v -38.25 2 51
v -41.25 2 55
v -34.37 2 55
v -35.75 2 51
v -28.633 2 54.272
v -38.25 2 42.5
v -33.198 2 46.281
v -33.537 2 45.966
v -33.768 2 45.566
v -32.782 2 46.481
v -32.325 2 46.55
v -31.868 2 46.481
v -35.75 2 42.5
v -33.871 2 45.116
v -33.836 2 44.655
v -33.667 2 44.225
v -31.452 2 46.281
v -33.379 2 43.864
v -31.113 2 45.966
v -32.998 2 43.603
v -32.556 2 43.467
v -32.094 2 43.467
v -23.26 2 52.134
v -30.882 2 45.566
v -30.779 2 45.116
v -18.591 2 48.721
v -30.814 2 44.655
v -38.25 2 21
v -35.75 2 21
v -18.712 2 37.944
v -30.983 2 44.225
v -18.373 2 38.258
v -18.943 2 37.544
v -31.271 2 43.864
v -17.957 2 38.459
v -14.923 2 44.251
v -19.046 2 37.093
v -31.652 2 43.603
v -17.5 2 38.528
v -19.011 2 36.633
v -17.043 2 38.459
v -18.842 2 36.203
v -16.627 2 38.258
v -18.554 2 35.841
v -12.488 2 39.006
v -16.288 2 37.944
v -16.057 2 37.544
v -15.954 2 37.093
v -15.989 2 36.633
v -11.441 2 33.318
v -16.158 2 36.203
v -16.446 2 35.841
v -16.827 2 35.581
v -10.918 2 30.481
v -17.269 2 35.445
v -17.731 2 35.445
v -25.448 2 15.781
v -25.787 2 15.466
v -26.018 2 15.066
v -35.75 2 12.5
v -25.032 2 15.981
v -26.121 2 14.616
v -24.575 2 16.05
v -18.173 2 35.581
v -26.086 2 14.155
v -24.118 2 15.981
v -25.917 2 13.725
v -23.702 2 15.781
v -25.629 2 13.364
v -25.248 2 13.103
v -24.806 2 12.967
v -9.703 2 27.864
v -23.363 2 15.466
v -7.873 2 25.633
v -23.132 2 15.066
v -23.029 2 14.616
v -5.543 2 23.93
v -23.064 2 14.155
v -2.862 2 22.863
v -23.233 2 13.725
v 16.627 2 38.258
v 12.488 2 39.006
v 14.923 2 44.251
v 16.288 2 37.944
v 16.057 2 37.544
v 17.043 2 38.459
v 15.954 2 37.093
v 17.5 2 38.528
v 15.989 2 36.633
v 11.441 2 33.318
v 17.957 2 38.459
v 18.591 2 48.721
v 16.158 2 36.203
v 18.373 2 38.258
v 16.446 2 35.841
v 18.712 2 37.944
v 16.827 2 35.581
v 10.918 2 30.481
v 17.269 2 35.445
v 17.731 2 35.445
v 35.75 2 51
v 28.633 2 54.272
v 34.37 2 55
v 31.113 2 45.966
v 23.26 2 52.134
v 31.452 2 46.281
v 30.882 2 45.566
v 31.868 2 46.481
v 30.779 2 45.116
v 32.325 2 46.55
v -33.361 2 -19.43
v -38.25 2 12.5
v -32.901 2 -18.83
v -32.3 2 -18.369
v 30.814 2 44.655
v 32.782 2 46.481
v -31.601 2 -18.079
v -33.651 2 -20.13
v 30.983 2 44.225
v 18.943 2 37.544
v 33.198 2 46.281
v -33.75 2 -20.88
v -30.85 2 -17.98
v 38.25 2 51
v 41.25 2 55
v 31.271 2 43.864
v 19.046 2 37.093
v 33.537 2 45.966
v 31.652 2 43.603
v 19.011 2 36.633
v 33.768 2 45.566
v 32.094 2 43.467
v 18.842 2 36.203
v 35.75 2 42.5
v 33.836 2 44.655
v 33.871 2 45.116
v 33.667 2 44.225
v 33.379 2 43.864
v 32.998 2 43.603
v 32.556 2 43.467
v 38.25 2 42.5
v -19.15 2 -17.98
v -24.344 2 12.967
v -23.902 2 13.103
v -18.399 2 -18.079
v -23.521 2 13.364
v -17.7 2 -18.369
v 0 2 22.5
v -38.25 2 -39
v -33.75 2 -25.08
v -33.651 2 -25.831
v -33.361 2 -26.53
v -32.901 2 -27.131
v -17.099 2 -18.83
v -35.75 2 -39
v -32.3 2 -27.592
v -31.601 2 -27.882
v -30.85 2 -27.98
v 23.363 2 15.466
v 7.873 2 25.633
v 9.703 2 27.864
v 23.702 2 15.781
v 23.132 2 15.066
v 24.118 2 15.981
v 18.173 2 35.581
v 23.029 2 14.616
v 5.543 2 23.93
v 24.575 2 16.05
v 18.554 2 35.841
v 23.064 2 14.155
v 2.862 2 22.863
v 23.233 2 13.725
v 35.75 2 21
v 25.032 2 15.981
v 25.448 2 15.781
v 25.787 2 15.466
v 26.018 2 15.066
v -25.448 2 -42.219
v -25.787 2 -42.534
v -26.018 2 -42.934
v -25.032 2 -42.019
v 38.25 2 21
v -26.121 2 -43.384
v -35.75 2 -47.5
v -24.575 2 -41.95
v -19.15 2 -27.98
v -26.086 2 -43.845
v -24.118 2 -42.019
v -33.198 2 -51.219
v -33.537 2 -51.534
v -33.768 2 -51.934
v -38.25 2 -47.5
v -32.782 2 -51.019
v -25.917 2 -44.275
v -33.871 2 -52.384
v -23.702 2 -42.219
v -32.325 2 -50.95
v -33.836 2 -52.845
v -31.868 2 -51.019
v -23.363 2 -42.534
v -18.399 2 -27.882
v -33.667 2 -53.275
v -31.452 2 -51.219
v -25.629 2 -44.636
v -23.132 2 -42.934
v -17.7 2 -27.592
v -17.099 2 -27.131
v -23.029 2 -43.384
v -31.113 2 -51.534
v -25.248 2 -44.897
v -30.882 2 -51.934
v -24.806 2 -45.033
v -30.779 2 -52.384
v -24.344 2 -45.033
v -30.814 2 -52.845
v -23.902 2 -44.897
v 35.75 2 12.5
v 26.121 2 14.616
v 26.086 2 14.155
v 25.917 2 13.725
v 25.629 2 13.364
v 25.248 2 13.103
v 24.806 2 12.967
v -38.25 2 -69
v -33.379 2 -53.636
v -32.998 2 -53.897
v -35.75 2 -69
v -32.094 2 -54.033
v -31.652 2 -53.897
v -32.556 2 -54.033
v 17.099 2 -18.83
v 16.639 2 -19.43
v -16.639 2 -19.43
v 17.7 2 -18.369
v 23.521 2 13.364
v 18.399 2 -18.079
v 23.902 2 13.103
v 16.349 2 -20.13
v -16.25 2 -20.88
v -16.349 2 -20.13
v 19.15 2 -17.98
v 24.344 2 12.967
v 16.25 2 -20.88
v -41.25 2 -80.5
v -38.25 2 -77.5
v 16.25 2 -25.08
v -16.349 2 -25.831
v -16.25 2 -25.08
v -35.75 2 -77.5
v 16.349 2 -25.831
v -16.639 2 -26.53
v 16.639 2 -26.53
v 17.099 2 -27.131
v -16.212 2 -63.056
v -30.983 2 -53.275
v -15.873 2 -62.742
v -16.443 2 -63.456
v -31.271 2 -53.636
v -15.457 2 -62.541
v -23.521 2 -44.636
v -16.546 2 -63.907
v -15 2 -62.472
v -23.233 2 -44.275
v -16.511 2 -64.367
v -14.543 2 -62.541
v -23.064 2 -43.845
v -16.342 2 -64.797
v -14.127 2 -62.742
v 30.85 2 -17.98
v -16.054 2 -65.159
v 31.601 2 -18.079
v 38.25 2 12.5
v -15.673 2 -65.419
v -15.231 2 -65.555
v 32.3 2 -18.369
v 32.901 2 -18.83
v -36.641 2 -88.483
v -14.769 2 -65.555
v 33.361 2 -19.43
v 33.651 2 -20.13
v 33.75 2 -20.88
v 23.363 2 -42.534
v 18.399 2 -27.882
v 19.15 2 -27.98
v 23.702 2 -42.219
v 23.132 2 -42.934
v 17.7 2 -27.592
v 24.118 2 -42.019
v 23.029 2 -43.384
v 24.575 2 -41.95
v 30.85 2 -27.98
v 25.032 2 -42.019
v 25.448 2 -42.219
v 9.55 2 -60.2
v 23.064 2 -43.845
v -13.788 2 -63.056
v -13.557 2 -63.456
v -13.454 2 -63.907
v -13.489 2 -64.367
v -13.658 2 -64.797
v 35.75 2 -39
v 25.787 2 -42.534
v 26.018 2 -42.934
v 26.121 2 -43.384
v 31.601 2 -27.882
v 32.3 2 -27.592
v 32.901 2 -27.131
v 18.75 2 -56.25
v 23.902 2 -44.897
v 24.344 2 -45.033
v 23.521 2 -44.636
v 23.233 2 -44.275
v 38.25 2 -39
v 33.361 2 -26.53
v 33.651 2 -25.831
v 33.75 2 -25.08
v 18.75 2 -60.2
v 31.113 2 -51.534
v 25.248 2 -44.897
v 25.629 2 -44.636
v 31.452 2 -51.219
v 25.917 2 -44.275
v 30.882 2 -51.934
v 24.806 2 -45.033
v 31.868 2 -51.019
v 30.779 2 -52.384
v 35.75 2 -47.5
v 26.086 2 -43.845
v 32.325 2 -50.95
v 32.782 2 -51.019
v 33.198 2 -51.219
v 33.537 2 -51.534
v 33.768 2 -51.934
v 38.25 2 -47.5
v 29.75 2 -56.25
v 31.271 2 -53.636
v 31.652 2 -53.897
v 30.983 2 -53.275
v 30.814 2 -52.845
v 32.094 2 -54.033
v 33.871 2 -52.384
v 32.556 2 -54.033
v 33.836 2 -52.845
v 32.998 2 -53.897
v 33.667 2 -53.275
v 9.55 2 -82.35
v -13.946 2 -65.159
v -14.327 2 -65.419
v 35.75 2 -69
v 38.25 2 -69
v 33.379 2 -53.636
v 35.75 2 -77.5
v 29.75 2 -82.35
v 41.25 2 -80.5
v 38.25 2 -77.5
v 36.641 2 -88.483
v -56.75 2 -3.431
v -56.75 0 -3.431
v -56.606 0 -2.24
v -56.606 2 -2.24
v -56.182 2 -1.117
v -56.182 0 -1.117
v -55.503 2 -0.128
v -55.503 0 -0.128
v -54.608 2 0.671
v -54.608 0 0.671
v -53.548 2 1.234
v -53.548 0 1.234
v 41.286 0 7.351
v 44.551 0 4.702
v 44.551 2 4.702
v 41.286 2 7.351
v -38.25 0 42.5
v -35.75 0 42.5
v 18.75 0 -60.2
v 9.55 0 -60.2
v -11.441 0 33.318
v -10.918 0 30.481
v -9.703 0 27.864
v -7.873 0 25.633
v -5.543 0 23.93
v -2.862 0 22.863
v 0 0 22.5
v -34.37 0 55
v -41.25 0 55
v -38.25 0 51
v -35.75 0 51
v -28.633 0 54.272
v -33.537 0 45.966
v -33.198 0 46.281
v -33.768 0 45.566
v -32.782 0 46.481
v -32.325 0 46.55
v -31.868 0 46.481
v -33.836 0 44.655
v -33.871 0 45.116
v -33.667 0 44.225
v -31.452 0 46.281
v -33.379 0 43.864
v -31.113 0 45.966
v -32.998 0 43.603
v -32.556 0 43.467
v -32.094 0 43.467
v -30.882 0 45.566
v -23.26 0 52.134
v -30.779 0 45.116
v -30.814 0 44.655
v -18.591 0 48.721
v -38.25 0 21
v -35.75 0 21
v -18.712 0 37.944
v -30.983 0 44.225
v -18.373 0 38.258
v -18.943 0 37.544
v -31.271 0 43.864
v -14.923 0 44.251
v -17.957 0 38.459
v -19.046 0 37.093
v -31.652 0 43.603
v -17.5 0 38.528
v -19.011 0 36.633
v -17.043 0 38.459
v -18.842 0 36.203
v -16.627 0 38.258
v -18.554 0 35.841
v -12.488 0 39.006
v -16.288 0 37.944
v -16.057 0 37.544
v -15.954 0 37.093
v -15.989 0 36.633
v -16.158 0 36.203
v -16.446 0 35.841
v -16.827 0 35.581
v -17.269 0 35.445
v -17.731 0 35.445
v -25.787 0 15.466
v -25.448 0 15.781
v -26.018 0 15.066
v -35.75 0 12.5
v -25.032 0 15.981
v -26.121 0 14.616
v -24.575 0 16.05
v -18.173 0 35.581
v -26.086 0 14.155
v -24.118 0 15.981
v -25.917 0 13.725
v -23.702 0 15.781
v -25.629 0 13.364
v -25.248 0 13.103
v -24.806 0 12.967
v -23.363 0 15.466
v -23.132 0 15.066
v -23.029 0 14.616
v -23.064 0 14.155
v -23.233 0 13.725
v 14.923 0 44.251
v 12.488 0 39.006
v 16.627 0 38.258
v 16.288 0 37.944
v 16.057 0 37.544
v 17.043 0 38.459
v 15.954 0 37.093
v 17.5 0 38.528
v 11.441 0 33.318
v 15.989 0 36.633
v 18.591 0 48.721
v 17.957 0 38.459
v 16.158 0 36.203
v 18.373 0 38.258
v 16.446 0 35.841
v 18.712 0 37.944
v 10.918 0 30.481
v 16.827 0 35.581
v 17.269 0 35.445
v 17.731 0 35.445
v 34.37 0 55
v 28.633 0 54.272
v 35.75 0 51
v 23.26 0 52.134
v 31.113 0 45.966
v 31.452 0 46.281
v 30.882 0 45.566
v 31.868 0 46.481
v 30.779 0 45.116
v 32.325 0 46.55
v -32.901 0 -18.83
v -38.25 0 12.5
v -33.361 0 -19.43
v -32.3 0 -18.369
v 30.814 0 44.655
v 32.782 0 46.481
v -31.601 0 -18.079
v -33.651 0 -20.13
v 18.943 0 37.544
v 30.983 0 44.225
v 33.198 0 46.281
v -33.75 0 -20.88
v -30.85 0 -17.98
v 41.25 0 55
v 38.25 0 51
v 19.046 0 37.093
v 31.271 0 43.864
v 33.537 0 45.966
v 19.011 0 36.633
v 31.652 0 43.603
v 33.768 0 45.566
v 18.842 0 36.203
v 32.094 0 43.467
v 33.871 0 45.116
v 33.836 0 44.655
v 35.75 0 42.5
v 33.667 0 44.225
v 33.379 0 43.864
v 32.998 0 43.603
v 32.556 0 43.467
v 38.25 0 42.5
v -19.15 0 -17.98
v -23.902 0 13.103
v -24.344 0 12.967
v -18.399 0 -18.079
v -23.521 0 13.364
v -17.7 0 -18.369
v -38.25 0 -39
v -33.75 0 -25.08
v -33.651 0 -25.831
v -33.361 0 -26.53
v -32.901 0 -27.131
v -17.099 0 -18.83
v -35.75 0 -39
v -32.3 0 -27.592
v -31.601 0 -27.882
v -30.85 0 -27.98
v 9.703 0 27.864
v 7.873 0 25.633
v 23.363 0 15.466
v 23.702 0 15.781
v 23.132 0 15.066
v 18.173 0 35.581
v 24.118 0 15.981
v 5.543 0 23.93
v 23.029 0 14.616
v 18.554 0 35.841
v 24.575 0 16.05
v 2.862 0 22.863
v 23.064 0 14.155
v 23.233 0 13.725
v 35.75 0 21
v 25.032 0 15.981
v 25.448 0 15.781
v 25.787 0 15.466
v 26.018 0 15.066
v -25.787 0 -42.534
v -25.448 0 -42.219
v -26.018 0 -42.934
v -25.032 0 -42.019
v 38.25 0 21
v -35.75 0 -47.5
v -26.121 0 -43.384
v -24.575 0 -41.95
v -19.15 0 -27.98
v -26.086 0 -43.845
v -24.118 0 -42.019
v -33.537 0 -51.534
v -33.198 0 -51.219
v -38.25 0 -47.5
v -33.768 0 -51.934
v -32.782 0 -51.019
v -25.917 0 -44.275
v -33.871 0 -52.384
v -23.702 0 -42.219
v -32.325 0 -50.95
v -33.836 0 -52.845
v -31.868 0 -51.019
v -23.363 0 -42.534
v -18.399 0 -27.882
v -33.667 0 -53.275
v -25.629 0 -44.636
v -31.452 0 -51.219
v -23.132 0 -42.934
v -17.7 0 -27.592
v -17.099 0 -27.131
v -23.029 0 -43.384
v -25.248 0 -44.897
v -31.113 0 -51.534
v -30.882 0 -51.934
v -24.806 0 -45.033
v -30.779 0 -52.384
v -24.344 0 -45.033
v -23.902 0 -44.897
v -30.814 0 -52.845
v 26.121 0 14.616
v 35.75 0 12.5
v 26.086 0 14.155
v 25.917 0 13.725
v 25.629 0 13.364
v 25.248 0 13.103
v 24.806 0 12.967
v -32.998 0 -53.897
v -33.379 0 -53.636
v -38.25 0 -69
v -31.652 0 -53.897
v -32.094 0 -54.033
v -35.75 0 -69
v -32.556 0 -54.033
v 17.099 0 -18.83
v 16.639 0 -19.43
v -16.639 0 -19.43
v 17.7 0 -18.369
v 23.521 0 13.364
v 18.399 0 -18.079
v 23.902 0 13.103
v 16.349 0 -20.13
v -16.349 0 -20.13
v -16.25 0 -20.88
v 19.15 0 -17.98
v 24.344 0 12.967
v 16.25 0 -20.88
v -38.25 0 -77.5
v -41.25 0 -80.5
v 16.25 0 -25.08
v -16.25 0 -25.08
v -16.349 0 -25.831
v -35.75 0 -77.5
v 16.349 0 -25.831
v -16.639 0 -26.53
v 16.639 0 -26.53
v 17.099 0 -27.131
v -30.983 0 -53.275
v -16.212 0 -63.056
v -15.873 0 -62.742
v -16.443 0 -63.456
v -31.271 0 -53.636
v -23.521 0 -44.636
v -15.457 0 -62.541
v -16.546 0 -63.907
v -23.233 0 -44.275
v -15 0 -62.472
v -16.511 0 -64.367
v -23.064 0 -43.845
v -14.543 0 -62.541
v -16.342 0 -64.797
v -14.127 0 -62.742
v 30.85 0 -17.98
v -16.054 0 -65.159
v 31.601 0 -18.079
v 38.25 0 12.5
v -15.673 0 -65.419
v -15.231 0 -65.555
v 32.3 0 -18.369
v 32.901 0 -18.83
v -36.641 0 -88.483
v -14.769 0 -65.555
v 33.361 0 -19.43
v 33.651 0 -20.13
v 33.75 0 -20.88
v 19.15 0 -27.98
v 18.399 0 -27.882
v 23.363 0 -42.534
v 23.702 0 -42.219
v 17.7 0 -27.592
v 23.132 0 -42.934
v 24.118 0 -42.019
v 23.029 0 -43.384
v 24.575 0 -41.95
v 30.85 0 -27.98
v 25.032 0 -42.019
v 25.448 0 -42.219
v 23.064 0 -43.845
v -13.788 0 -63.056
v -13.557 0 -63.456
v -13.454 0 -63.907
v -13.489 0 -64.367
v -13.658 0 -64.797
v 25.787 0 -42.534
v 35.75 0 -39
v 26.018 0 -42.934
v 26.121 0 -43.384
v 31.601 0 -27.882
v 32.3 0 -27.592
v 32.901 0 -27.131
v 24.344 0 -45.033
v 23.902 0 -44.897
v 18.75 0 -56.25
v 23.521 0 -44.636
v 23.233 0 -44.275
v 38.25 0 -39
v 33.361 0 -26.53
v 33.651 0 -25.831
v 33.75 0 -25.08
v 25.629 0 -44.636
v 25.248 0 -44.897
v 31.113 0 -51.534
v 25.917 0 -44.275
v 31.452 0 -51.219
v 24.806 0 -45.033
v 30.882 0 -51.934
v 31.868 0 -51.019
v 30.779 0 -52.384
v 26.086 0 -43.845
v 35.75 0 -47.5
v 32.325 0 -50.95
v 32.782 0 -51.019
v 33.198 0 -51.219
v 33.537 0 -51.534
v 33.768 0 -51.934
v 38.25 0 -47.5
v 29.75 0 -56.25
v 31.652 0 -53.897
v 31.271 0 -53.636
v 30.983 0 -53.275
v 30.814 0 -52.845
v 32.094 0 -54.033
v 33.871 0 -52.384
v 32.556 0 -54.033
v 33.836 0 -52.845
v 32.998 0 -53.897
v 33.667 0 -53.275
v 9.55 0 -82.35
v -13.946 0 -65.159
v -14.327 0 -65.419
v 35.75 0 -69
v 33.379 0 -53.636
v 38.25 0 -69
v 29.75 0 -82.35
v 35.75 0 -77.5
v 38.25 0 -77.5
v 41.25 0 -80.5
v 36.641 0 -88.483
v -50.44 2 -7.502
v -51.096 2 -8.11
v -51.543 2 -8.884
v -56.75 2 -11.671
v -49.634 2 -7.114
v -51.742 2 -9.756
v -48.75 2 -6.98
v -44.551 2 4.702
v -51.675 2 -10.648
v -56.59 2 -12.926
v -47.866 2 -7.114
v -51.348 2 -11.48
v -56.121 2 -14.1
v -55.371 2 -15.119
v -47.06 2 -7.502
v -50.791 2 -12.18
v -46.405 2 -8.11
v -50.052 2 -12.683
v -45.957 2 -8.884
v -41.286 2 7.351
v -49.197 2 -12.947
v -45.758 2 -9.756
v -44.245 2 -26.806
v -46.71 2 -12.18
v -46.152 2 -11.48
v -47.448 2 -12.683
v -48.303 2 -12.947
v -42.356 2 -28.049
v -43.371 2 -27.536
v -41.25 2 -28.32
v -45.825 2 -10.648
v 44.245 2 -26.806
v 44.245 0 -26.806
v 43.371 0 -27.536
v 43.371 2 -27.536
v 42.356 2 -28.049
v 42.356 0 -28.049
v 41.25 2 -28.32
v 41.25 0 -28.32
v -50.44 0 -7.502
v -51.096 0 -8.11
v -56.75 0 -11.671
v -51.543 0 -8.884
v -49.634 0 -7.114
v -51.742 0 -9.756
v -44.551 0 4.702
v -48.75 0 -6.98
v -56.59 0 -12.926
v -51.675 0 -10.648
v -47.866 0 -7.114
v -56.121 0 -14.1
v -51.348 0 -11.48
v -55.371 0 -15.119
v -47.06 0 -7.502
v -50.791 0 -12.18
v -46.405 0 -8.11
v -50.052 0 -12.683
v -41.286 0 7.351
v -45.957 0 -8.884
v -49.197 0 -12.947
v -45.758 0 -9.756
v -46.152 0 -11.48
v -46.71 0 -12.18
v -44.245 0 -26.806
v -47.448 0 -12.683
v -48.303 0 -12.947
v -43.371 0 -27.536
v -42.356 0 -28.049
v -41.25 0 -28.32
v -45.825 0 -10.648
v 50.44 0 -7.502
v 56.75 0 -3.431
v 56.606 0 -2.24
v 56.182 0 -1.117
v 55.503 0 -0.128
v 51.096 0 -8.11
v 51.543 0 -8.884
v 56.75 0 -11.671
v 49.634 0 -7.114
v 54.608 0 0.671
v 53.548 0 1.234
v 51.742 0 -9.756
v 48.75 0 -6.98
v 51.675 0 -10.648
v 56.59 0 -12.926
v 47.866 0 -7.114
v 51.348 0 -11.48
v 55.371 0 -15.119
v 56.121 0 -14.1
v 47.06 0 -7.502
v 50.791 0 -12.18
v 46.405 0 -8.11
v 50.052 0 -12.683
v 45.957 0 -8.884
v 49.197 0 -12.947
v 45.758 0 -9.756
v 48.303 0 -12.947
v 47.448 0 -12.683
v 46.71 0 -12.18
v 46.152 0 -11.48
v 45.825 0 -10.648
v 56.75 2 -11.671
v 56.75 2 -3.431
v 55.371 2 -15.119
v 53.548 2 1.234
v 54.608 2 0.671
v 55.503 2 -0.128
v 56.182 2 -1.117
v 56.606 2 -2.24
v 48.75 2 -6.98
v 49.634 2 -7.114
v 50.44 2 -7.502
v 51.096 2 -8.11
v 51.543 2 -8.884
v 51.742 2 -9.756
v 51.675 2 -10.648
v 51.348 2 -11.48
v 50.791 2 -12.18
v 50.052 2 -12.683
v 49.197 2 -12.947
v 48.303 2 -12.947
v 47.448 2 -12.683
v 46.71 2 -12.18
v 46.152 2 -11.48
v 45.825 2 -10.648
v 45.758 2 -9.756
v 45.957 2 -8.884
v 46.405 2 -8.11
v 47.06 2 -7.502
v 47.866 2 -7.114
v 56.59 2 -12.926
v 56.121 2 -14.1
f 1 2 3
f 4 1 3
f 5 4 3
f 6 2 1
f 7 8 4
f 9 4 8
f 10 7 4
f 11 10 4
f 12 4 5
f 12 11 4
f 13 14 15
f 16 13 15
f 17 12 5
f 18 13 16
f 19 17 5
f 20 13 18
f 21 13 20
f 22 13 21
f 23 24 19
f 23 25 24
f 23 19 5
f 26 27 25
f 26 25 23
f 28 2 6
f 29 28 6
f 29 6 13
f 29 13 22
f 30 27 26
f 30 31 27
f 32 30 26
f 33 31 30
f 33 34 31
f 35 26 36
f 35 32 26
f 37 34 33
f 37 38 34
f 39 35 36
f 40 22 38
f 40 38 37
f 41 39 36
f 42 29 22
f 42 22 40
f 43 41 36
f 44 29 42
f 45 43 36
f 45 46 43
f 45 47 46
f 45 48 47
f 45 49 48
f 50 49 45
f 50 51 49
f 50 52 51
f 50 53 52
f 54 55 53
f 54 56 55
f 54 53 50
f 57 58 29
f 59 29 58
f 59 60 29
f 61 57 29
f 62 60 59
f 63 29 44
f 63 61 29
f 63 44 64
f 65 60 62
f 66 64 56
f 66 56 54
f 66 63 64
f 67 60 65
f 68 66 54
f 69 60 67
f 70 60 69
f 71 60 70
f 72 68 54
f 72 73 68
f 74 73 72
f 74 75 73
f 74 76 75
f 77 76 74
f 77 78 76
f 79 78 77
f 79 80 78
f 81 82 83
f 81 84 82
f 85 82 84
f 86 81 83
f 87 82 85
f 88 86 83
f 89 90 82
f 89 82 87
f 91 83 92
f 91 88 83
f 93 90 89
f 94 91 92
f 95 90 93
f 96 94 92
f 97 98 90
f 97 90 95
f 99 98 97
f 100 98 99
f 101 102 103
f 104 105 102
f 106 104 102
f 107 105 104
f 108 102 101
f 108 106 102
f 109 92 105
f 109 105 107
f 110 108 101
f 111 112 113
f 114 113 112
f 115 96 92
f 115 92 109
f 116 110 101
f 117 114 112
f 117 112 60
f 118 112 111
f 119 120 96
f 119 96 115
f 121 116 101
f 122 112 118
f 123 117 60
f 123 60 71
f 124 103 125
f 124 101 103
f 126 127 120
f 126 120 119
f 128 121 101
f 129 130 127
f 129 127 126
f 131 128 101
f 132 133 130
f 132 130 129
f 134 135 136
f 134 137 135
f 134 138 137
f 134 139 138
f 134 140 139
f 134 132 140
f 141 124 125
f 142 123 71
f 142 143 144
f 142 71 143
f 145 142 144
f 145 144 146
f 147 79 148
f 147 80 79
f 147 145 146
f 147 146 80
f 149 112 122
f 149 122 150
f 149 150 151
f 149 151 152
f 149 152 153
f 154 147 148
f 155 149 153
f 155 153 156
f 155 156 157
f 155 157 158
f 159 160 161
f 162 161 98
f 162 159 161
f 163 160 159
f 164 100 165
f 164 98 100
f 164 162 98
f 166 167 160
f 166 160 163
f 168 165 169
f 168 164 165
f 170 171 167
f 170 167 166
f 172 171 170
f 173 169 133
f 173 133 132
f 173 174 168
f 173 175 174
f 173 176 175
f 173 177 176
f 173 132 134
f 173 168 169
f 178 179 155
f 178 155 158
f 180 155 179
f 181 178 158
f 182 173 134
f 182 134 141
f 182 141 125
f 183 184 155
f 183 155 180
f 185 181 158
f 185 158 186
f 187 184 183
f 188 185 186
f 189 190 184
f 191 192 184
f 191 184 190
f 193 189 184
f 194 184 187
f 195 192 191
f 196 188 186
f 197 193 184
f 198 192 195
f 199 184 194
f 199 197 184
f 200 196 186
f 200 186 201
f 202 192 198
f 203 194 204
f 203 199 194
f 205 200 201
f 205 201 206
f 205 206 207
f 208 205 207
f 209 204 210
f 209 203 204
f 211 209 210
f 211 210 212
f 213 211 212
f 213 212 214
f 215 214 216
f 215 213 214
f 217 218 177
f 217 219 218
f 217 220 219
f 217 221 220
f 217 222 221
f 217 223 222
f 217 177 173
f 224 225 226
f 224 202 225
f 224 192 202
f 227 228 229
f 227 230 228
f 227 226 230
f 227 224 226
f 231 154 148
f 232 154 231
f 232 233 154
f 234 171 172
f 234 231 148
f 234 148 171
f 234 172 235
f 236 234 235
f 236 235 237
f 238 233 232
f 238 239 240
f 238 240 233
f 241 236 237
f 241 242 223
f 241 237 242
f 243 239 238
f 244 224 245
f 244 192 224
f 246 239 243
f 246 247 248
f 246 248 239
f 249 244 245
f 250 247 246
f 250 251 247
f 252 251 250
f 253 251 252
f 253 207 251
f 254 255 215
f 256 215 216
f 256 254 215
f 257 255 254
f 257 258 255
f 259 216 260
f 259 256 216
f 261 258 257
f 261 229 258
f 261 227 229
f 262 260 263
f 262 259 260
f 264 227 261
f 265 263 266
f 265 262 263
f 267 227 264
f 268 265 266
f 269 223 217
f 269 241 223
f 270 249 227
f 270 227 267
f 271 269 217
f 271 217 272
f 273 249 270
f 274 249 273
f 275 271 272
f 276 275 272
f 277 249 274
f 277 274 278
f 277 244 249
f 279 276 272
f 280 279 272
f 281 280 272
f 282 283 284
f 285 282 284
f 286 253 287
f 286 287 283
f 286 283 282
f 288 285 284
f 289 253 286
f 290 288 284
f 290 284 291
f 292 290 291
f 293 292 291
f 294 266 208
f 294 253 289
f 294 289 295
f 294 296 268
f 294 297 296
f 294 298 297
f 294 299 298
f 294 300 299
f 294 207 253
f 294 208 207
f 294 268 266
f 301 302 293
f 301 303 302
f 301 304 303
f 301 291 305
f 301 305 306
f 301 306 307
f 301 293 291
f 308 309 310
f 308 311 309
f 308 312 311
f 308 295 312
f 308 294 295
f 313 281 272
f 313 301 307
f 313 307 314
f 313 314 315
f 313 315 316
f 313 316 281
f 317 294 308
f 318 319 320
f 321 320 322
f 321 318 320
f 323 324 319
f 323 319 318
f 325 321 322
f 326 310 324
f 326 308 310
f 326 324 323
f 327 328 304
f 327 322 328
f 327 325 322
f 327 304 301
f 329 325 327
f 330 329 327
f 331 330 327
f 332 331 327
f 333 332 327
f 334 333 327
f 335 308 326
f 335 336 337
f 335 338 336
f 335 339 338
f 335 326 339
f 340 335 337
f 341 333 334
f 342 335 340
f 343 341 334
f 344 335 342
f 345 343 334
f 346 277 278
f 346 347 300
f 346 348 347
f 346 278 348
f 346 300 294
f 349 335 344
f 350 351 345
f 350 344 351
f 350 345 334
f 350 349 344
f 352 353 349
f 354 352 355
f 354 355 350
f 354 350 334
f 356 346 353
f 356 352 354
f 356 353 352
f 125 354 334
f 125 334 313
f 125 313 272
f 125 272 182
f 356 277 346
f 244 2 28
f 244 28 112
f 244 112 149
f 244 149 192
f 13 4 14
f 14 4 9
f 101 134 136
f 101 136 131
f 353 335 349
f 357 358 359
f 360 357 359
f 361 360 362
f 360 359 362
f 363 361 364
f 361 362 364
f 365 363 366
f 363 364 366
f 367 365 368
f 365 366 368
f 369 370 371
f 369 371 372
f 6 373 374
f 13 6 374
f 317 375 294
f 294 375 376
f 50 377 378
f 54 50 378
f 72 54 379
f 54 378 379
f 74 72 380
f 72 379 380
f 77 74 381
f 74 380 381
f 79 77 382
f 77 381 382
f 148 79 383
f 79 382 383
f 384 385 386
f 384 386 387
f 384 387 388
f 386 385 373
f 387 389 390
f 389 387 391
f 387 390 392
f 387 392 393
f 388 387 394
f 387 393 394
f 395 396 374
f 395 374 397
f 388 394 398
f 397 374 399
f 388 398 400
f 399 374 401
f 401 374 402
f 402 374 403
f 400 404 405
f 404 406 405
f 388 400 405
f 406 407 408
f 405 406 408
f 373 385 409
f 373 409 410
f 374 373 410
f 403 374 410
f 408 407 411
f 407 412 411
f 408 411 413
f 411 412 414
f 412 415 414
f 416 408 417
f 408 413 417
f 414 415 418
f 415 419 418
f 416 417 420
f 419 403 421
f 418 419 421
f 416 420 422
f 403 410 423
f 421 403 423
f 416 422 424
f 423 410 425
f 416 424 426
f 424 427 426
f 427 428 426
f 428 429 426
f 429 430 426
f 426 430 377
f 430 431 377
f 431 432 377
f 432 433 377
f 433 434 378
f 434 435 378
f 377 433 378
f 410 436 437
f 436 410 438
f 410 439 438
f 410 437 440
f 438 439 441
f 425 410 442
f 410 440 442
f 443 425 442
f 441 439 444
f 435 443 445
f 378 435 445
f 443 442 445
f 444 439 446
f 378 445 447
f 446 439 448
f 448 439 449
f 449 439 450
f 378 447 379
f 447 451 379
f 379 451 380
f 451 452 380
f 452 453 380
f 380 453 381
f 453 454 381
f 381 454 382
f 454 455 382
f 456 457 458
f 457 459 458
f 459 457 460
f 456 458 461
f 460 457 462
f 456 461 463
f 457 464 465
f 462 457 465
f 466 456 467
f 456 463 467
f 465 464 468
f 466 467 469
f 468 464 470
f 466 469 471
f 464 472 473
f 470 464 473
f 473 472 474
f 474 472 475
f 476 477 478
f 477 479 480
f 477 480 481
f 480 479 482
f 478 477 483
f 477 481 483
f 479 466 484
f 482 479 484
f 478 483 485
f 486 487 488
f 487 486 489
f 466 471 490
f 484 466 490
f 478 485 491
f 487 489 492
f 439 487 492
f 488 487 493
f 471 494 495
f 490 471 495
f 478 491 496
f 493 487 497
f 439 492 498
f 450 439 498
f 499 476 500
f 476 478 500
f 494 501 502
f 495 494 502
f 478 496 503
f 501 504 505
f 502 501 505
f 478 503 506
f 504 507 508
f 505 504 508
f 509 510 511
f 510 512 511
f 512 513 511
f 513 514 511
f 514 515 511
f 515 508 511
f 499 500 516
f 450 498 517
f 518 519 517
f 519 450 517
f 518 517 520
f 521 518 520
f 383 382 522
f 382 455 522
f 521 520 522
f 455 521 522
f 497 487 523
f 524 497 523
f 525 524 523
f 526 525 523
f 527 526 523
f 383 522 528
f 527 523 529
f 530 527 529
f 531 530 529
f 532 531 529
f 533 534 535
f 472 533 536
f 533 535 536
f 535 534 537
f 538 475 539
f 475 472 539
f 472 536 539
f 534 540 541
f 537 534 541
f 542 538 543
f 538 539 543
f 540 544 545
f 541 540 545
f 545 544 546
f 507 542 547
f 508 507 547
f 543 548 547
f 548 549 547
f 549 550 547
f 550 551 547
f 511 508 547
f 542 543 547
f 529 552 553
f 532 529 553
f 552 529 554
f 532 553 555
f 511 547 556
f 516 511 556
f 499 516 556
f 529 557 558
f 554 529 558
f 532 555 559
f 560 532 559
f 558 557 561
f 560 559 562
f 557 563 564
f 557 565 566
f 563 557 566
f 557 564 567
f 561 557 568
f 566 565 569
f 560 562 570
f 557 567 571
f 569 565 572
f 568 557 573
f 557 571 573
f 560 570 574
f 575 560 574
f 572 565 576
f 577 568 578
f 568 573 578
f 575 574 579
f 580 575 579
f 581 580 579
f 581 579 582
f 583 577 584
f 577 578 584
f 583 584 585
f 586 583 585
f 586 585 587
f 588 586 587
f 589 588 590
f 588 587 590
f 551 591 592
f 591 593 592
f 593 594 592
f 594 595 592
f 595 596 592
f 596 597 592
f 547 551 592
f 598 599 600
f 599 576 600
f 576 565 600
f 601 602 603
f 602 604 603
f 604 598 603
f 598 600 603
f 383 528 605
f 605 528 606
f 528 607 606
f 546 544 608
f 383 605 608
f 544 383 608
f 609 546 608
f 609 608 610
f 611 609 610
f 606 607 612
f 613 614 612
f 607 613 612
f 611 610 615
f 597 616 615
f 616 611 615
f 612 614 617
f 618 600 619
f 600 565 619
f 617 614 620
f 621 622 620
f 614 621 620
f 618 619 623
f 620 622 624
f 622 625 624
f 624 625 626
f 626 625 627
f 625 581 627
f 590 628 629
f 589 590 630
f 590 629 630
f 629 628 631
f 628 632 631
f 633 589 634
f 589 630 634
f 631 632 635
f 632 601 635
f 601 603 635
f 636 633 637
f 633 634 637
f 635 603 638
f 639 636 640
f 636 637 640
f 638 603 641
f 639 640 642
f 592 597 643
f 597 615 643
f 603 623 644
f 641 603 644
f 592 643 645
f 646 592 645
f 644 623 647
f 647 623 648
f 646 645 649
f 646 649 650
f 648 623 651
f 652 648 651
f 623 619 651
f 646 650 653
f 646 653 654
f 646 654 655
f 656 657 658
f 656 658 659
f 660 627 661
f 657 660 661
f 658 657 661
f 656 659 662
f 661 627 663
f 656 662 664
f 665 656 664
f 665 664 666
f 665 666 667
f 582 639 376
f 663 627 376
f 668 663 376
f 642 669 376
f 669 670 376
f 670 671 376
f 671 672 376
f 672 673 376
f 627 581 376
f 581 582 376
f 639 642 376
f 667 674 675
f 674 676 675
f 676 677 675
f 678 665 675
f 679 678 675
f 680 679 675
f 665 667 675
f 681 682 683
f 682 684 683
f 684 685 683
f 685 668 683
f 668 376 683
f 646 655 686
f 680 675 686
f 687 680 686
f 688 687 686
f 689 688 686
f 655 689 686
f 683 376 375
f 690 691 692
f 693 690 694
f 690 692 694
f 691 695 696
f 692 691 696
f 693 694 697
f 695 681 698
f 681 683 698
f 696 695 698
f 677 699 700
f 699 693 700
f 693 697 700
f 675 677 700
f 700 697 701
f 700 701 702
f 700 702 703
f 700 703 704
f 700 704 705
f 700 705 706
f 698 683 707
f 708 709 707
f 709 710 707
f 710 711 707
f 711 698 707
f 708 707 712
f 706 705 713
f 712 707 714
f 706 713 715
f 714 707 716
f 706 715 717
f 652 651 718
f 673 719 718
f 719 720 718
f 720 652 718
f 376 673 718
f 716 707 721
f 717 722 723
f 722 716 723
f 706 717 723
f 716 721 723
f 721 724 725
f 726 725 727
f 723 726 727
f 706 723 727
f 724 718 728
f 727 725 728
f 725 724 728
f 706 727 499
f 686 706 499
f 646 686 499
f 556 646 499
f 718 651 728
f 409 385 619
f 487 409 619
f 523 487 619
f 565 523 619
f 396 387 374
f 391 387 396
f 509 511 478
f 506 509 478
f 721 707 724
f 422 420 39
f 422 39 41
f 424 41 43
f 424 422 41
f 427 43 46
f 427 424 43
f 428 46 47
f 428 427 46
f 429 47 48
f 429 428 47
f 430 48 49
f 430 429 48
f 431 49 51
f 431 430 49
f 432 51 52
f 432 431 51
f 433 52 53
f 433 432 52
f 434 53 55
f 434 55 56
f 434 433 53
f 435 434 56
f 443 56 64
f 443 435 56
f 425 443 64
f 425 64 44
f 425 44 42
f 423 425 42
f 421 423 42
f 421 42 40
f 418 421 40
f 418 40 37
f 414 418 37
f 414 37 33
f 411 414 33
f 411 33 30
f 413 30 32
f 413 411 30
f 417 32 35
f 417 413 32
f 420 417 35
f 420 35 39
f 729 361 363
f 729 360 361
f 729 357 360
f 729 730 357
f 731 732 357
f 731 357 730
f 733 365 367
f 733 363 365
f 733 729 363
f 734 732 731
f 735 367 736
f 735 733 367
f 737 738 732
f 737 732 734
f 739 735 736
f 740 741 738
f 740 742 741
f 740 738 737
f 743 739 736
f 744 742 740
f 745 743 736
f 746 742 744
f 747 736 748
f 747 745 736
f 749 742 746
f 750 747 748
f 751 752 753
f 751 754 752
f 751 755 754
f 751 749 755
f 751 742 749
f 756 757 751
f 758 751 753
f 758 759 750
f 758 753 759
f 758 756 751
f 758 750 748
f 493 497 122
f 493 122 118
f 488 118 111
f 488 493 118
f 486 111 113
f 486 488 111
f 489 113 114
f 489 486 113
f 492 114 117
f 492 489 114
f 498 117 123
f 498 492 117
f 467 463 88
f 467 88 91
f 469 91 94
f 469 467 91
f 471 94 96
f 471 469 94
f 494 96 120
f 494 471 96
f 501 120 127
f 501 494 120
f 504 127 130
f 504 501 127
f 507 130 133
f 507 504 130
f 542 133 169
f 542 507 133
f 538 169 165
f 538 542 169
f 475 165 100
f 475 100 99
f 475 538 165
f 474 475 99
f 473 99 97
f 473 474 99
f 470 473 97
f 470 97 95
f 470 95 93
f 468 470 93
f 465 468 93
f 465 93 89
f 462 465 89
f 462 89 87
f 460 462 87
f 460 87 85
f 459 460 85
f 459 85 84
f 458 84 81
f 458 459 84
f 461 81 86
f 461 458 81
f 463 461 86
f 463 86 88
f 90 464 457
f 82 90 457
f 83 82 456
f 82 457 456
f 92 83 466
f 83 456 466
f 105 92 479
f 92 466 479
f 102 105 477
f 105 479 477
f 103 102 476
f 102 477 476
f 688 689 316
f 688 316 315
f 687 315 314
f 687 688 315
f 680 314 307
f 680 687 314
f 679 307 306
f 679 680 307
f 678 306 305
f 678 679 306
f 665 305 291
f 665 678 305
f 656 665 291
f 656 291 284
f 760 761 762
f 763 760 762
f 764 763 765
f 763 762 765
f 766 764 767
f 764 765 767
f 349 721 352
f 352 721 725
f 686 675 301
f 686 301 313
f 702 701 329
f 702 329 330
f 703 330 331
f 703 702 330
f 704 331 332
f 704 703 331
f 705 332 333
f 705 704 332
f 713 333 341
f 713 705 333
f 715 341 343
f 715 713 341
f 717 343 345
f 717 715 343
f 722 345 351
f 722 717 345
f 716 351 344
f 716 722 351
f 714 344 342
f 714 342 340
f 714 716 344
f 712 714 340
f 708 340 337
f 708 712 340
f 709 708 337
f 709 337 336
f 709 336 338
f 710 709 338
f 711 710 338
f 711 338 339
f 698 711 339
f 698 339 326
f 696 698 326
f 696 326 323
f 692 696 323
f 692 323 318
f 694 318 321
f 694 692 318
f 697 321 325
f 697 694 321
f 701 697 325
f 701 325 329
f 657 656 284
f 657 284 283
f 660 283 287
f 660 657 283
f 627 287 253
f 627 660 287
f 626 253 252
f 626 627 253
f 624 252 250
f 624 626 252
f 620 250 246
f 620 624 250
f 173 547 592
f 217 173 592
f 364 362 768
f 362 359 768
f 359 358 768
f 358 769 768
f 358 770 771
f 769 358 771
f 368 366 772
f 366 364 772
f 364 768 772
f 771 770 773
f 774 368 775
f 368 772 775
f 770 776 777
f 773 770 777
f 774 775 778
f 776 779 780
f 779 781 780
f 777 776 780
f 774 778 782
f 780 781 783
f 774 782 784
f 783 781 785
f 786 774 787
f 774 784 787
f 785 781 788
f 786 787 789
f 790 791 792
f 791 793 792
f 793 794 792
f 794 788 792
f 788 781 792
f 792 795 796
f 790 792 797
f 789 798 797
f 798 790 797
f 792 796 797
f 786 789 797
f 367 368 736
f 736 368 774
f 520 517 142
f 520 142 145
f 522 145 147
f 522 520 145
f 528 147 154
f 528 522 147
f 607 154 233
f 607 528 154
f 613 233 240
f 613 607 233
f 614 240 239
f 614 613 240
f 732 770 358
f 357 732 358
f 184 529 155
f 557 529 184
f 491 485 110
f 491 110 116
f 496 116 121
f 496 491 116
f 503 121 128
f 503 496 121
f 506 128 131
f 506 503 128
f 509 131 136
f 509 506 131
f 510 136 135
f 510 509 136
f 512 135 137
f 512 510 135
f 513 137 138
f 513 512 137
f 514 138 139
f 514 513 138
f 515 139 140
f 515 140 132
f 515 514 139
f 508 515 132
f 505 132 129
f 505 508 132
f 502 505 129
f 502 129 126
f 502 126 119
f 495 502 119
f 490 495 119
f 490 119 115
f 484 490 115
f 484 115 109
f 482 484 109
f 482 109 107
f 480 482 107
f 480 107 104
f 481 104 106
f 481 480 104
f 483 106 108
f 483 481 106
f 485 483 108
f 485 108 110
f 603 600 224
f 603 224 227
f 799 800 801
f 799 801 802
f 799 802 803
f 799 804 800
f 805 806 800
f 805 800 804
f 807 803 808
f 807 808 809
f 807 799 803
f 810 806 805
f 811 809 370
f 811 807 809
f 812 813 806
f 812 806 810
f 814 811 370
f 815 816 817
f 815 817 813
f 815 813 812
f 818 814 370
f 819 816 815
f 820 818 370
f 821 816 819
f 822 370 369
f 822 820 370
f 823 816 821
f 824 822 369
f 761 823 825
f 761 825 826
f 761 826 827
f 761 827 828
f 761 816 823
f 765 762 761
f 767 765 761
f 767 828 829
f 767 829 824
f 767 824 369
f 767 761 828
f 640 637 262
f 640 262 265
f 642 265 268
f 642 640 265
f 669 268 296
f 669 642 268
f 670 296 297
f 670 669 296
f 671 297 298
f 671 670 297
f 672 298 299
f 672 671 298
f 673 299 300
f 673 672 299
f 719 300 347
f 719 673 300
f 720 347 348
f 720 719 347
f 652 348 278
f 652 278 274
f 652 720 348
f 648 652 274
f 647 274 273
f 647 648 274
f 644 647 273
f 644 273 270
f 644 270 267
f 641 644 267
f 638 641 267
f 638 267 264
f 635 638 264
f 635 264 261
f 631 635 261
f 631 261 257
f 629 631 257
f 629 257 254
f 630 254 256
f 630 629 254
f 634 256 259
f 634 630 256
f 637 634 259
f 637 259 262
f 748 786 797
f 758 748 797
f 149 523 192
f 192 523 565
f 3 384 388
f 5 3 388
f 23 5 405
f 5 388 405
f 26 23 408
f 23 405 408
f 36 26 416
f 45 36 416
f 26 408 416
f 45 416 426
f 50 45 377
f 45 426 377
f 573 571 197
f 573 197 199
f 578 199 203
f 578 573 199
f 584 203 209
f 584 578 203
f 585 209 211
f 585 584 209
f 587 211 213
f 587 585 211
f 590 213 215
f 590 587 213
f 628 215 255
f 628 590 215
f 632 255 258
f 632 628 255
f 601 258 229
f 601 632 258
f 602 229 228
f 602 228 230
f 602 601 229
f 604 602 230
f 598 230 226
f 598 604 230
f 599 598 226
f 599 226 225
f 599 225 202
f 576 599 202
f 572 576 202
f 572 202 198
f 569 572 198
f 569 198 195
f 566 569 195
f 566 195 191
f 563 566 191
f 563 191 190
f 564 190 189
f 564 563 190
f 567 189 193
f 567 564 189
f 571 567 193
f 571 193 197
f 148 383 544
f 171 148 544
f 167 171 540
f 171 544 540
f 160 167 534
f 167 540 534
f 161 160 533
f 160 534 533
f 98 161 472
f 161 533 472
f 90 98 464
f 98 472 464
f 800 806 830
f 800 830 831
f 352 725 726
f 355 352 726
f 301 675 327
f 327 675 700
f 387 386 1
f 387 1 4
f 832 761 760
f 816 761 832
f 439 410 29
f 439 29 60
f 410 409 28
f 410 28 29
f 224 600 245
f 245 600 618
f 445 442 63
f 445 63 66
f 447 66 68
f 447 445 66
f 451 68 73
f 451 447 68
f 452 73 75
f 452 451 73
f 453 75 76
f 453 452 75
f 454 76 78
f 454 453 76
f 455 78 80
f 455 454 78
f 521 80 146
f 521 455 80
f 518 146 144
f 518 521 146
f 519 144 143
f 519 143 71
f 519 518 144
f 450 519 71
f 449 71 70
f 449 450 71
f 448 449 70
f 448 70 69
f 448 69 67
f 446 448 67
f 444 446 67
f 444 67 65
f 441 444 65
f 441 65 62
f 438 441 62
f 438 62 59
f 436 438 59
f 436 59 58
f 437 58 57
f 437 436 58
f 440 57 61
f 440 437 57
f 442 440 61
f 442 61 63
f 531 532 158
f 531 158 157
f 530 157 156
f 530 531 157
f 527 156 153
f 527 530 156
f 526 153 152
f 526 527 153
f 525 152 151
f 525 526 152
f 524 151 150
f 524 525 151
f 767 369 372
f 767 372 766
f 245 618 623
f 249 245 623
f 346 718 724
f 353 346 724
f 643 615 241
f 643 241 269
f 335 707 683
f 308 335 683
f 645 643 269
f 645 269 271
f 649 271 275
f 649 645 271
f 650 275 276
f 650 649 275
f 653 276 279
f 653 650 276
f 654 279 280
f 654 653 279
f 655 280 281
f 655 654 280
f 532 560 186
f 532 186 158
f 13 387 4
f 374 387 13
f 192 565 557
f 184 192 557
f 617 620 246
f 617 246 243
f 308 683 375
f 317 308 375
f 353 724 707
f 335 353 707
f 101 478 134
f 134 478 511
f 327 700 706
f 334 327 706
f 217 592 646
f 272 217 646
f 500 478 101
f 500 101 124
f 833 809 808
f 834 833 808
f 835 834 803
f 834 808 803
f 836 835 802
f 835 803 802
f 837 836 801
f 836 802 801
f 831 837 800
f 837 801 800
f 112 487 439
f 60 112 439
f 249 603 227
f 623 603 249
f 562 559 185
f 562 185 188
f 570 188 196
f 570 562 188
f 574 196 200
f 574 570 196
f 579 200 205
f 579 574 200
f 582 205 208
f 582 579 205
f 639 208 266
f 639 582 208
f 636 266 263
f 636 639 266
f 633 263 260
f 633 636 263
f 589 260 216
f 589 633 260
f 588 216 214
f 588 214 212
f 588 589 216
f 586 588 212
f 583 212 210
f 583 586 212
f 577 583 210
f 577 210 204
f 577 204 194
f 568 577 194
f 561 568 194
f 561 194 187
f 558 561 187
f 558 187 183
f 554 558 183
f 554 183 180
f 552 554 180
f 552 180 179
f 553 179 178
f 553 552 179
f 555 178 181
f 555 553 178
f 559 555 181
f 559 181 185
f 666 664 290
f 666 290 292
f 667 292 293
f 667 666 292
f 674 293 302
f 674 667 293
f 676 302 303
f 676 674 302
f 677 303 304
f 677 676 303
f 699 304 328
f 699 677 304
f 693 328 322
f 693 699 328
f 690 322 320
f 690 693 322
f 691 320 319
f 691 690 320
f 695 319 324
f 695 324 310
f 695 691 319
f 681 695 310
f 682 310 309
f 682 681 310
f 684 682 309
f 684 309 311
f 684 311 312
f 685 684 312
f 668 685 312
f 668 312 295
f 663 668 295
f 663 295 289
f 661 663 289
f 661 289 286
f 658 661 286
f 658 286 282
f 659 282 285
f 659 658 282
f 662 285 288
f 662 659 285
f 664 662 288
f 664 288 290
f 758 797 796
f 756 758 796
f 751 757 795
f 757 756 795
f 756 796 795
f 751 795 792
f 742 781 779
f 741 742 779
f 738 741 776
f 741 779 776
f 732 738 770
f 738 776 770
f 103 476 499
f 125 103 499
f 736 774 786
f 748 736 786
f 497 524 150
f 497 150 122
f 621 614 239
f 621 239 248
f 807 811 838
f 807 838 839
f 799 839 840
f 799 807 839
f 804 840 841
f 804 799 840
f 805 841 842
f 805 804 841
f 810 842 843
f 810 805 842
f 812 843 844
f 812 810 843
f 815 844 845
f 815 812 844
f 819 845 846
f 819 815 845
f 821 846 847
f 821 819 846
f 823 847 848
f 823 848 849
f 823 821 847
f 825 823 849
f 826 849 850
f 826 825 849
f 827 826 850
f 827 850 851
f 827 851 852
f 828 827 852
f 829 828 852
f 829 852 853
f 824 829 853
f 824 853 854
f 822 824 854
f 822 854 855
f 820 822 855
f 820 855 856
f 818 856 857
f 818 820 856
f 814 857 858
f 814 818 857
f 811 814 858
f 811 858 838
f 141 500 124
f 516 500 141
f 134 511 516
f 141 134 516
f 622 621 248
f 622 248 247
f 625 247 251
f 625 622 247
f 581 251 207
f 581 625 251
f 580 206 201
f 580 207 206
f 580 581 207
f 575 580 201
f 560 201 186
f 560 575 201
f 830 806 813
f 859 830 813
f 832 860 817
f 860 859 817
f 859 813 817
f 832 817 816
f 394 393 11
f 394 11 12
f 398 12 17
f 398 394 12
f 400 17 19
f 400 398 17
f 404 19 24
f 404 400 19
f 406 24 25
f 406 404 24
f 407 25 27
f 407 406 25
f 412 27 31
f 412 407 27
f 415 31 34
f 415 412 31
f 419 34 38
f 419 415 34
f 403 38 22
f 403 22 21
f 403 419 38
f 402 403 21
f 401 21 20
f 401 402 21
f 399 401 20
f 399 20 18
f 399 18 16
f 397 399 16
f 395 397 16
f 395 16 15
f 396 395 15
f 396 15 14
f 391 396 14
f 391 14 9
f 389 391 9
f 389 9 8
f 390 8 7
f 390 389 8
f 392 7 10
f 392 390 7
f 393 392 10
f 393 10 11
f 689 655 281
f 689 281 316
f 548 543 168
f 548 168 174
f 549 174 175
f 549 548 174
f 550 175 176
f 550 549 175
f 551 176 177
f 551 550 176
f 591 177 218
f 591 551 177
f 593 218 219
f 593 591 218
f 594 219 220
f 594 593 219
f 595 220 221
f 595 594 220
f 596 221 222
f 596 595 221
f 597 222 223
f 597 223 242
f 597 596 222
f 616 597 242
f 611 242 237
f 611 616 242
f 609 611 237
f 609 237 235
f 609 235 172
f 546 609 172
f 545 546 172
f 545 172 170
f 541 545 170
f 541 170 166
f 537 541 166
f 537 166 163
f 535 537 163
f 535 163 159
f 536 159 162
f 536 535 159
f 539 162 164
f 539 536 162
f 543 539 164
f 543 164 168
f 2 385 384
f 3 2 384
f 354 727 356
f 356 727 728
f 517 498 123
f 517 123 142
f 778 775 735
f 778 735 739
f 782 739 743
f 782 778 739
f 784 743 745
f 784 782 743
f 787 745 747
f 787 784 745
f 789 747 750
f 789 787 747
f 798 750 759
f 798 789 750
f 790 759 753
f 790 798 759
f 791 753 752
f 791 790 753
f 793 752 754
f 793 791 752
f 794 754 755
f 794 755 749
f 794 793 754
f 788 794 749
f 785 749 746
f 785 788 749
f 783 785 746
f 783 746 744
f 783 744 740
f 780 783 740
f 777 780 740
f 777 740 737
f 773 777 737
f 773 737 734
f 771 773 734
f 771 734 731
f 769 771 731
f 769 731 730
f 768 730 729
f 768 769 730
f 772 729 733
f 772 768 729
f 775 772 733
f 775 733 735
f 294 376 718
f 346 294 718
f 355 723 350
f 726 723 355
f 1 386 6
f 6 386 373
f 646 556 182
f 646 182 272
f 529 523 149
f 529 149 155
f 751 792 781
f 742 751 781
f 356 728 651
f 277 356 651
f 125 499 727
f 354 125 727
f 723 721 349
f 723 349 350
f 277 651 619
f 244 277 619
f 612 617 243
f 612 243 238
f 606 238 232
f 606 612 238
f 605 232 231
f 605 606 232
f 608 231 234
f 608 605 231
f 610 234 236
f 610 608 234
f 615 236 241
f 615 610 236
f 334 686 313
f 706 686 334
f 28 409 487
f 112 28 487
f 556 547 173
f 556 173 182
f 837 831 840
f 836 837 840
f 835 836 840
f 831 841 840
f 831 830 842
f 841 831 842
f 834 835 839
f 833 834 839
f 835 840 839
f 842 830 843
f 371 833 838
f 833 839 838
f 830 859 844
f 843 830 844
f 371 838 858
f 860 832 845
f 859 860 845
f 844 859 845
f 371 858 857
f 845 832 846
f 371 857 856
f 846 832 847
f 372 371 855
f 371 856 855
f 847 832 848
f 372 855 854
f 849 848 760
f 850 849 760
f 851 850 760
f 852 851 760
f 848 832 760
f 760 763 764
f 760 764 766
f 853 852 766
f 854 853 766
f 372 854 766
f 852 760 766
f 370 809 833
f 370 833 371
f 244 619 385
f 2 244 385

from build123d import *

# Parameters (mm, degrees)
SKETCH1_W                   = 2.5
SKETCH1_H                   = 8.5
SKETCH1_R                   = 1.55
EXTRUDE_2777_DEPTH          = 2
SKETCH_3030_R               = 3
EXTRUDE_1_DEPTH             = 2
EXTRUDE_1_2_DEPTH           = 2
CUT_EXTRUDE_4639_DEPTH      = 106.13740862
CUT_EXTRUDE_4639_DEPTH_BACK = 106.13740862
FILLET_1_R                  = 5
FILLET_2_R                  = 5


with BuildPart() as part:
    # Sketch1 → Extrude 2777 (new body)
    with BuildSketch(Plane(origin=(0, 0, 0), x_dir=(1, 0, 0), z_dir=(0, 1, 0))):
        with BuildLine():
            Line((-41.25, 0), (-41.25, -55))
            Line((-41.25, -55), (-34.369560329, -55))
            ThreePointArc((-34.369560329, -55), (-18.59120626, -48.721265785), (-11.440696816, -33.31837076))
            ThreePointArc((-11.440696816, -33.31837076), (-7.872843983, -25.632867641), (0, -22.5))
            ThreePointArc((0, -22.5), (7.872843983, -25.632867641), (11.440696816, -33.31837076))
            ThreePointArc((11.440696816, -33.31837076), (18.59120626, -48.721265785), (34.369560329, -55))
            Line((34.369560329, -55), (41.25, -55))
            Line((41.25, -55), (41.25, 0))
            Line((41.25, 0), (41.25, 80.5))
            Line((41.25, 80.5), (36.640789302, 88.483387111))
            Line((36.640789302, 88.483387111), (-36.640789302, 88.483387111))
            Line((-36.640789302, 88.483387111), (-41.25, 80.5))
            Line((-41.25, 80.5), (-41.25, 0))
        make_face()
        with Locations((-37, -46.75)):
            Rectangle(SKETCH1_W, SKETCH1_H, mode=Mode.SUBTRACT)
        with Locations(Location((-32.325, -45, 0), (0, 0, 270))):
            Circle(SKETCH1_R, mode=Mode.SUBTRACT)
        with Locations(Location((-17.5, -36.97765453, 0), (0, 0, 270))):
            Circle(SKETCH1_R, mode=Mode.SUBTRACT)
        with Locations((-37, -16.75)):
            Rectangle(SKETCH1_W, SKETCH1_H, mode=Mode.SUBTRACT)
        with Locations(Location((-24.575, -14.5, 0), (0, 0, 270))):
            Circle(SKETCH1_R, mode=Mode.SUBTRACT)
        with Locations(Location((17.5, -36.97765453, 0), (0, 0, 270))):
            Circle(SKETCH1_R, mode=Mode.SUBTRACT)
        with Locations((37, -46.75)):
            Rectangle(SKETCH1_W, SKETCH1_H, mode=Mode.SUBTRACT)
        with Locations(Location((32.325, -45, 0), (0, 0, 270))):
            Circle(SKETCH1_R, mode=Mode.SUBTRACT)
        with Locations(Location((24.575, -14.5, 0), (0, 0, 270))):
            Circle(SKETCH1_R, mode=Mode.SUBTRACT)
        with Locations((37, -16.75)):
            Rectangle(SKETCH1_W, SKETCH1_H, mode=Mode.SUBTRACT)
        with Locations((-37, 43.25)):
            Rectangle(SKETCH1_W, SKETCH1_H, mode=Mode.SUBTRACT)
        with Locations(Location((-32.325, 52.5, 0), (0, 0, 270))):
            Circle(SKETCH1_R, mode=Mode.SUBTRACT)
        with Locations(Location((-24.575, 43.5, 0), (0, 0, 270))):
            Circle(SKETCH1_R, mode=Mode.SUBTRACT)
        with Locations((-37, 73.25)):
            Rectangle(SKETCH1_W, SKETCH1_H, mode=Mode.SUBTRACT)
        with Locations(Location((-15.000000144, 64.02234547, 0), (0, 0, 270))):
            Circle(SKETCH1_R, mode=Mode.SUBTRACT)
        with Locations(Location((24.575, 43.5, 0), (0, 0, 270))):
            Circle(SKETCH1_R, mode=Mode.SUBTRACT)
        with Locations((37, 43.25)):
            Rectangle(SKETCH1_W, SKETCH1_H, mode=Mode.SUBTRACT)
        with Locations(Location((32.325, 52.5, 0), (0, 0, 270))):
            Circle(SKETCH1_R, mode=Mode.SUBTRACT)
        Polygon((9.55, 60.2), (9.55, 82.35), (29.75, 82.35), (29.75, 56.25), (18.75, 56.25), (18.75, 60.2), align=None, mode=Mode.SUBTRACT)
        with Locations((37, 73.25)):
            Rectangle(SKETCH1_W, SKETCH1_H, mode=Mode.SUBTRACT)
    extrude(amount=EXTRUDE_2777_DEPTH)

    # 底部天线接口<3> → Cut-Extrude 4639 (cut, two sides: drawn at the far end of the back side and taken through both)
    with BuildSketch(Plane(origin=(0, 0, 0), x_dir=(1, 0, 0), z_dir=(0, 1, 0)).offset(-CUT_EXTRUDE_4639_DEPTH_BACK)):
        with BuildLine():
            Line((-30.85, 17.980435299), (-19.15, 17.980435299))
            ThreePointArc((-19.15, 17.980435299), (-17.099390335, 18.829825634), (-16.25, 20.880435299))
            Line((-16.25, 20.880435299), (-16.25, 25.080435299))
            ThreePointArc((-16.25, 25.080435299), (-17.099390335, 27.131044965), (-19.15, 27.980435299))
            Line((-19.15, 27.980435299), (-30.85, 27.980435299))
            ThreePointArc((-30.85, 27.980435299), (-32.900609665, 27.131044965), (-33.75, 25.080435299))
            Line((-33.75, 25.080435299), (-33.75, 20.880435299))
            ThreePointArc((-33.75, 20.880435299), (-32.900609665, 18.829825634), (-30.85, 17.980435299))
        make_face()
        with BuildLine():
            Line((30.85, 27.980435299), (19.15, 27.980435299))
            ThreePointArc((19.15, 27.980435299), (17.099390335, 27.131044965), (16.25, 25.080435299))
            Line((16.25, 25.080435299), (16.25, 20.880435299))
            ThreePointArc((16.25, 20.880435299), (17.099390335, 18.829825634), (19.15, 17.980435299))
            Line((19.15, 17.980435299), (30.85, 17.980435299))
            ThreePointArc((30.85, 17.980435299), (32.900609665, 18.829825634), (33.75, 20.880435299))
            Line((33.75, 20.880435299), (33.75, 25.080435299))
            ThreePointArc((33.75, 25.080435299), (32.900609665, 27.131044965), (30.85, 27.980435299))
        make_face()
    extrude(amount=CUT_EXTRUDE_4639_DEPTH + CUT_EXTRUDE_4639_DEPTH_BACK, mode=Mode.SUBTRACT)


with BuildPart() as body_2:
    # Sketch 3030 → 天线接口-1 (new body)
    with BuildSketch(Plane(origin=(0, 0, 0), x_dir=(1, 0, 0), z_dir=(0, 1, 0))):
        Polygon((-44.551087495, -4.702300511), (-41.285942601, -7.350545872), (-41.25, 28.319513771), (-42.804455524, 28.319513771), (-56.750021115, 13.670703557), (-56.750021115, 0), align=None)
        with Locations(Location((-48.750021115, 9.980435299, 0), (0, 0, 270))):
            Circle(SKETCH_3030_R, mode=Mode.SUBTRACT)
    extrude(amount=EXTRUDE_1_DEPTH)

    # 圆角1
    # the kernel refuses this fillet: 5 mm, written as the material it takes off along each edge
    with BuildSketch(Plane(origin=(-56.750021115, -8.578159327, 0), x_dir=(0, 0, -1), z_dir=(0, 1, 0))) as fillet_1_piece_1:
        with BuildLine():
            CenterArc((FILLET_1_R * 0.686252746169, -FILLET_1_R), FILLET_1_R, 90, 68.919937097)
            Line((-FILLET_1_R * 0.246825999537, -FILLET_1_R * 0.640327851633), (-FILLET_1_R * 0.265487574451, -FILLET_1_R * 0.633134408666))
            Line((-FILLET_1_R * 0.265487574451, -FILLET_1_R * 0.633134408666), (-FILLET_1_R * 0.0137250549234, FILLET_1_R * 0.02))
            Line((-FILLET_1_R * 0.0137250549234, FILLET_1_R * 0.02), (FILLET_1_R * 0.686252746169, FILLET_1_R * 0.02))
            Line((FILLET_1_R * 0.686252746169, FILLET_1_R * 0.02), (FILLET_1_R * 0.686252746169, 0))
        make_face()
    extrude(amount=19.156318654, mode=Mode.SUBTRACT)
    with BuildSketch(Plane(origin=(-56.750021115, -4.998525097, -13.670703557), x_dir=(0.6895078371932688, 0, -0.7242782217139079), z_dir=(0, 1, 0))) as fillet_1_piece_2:
        with BuildLine():
            CenterArc((FILLET_1_R * 0.399882007735, -FILLET_1_R), FILLET_1_R, 90, 43.591162535)
            Line((-FILLET_1_R * 0.289625829458, -FILLET_1_R * 0.275721778286), (-FILLET_1_R * 0.303415986202, -FILLET_1_R * 0.261236213852))
            Line((-FILLET_1_R * 0.303415986202, -FILLET_1_R * 0.261236213852), (-FILLET_1_R * 0.00799764015471, FILLET_1_R * 0.02))
            Line((-FILLET_1_R * 0.00799764015471, FILLET_1_R * 0.02), (FILLET_1_R * 0.399882007735, FILLET_1_R * 0.02))
            Line((FILLET_1_R * 0.399882007735, FILLET_1_R * 0.02), (FILLET_1_R * 0.399882007735, 0))
        make_face()
    extrude(amount=11.997050193, mode=Mode.SUBTRACT)
    with BuildSketch(Plane(origin=(-42.804455524, -5.222622885, -28.319513771), x_dir=(1, 0, 0), z_dir=(0, 1, 0))) as fillet_1_piece_3:
        with BuildLine():
            CenterArc((2.180975345, -4.960591992), FILLET_1_R, 97.198309661, 39.210527804)
            Line((-1.440415764, -1.513052806), (-1.512843586, -1.444102023))
            Line((-1.512843586, -1.444102023), (-0.072427822, 0.068950784))
            Line((-0.072427822, 0.068950784), (0, 0.1))
            ThreePointArc((0, 0.1), (0.777227762, 0.1), (1.541925127, 0.09921184))
            Line((1.541925127, 0.09921184), (1.554455524, 0))
        make_face()
    extrude(amount=12.44524577, mode=Mode.SUBTRACT)


with BuildPart() as body_3:
    # Sketch 3030 → Extrude 1 2 (new body)
    with BuildSketch(Plane(origin=(0, 0, 0), x_dir=(1, 0, 0), z_dir=(0, 1, 0))):
        Polygon((42.804455524, 28.319513771), (56.750021115, 13.670703557), (56.750021115, 0), (44.551087495, -4.702300511), (41.285942601, -7.350545872), (41.25, 28.319513771), align=None)
        with Locations(Location((48.750021115, 9.980435299, 0), (0, 0, 270))):
            Circle(SKETCH_3030_R, mode=Mode.SUBTRACT)
    extrude(amount=EXTRUDE_1_2_DEPTH)

    # 圆角2
    # the kernel refuses this fillet: 5 mm, written as the material it takes off along each edge
    with BuildSketch(Plane(origin=(56.750021115, -8.578159327, 0), x_dir=(0, 0, -1), z_dir=(0, 1, 0))) as fillet_2_piece_1:
        with BuildLine():
            CenterArc((FILLET_2_R * 0.686252746169, FILLET_2_R), FILLET_2_R, 201.080062903, 68.919937097)
            Line((-FILLET_2_R * 0.246825999537, FILLET_2_R * 0.640327851633), (-FILLET_2_R * 0.265487574451, FILLET_2_R * 0.633134408666))
            Line((-FILLET_2_R * 0.265487574451, FILLET_2_R * 0.633134408666), (-FILLET_2_R * 0.0137250549234, -FILLET_2_R * 0.02))
            Line((-FILLET_2_R * 0.0137250549234, -FILLET_2_R * 0.02), (FILLET_2_R * 0.686252746169, -FILLET_2_R * 0.02))
            Line((FILLET_2_R * 0.686252746169, -FILLET_2_R * 0.02), (FILLET_2_R * 0.686252746169, 0))
        make_face()
    extrude(amount=19.156318654, mode=Mode.SUBTRACT)
    with BuildSketch(Plane(origin=(56.750021115, -4.998525097, -13.670703557), x_dir=(-0.6895078371932707, 0, -0.724278221713906), z_dir=(0, 1, 0))) as fillet_2_piece_2:
        with BuildLine():
            CenterArc((FILLET_2_R * 0.399882007735, FILLET_2_R), FILLET_2_R, 226.408837465, 43.591162535)
            Line((-FILLET_2_R * 0.289625829458, FILLET_2_R * 0.275721778286), (-FILLET_2_R * 0.303415986202, FILLET_2_R * 0.261236213852))
            Line((-FILLET_2_R * 0.303415986202, FILLET_2_R * 0.261236213852), (-FILLET_2_R * 0.00799764015471, -FILLET_2_R * 0.02))
            Line((-FILLET_2_R * 0.00799764015471, -FILLET_2_R * 0.02), (FILLET_2_R * 0.399882007735, -FILLET_2_R * 0.02))
            Line((FILLET_2_R * 0.399882007735, -FILLET_2_R * 0.02), (FILLET_2_R * 0.399882007735, 0))
        make_face()
    extrude(amount=11.997050193, mode=Mode.SUBTRACT)
    with BuildSketch(Plane(origin=(42.804455524, -5.222622885, -28.319513771), x_dir=(0.6895078371932738, 0, 0.7242782217139031), z_dir=(0, 1, 0))) as fillet_2_piece_3:
        with BuildLine():
            CenterArc((2.089049154, -5), FILLET_2_R, 90, 39.210527804)
            Line((-1.071809266, -1.125858282), (-1.135026435, -1.048375448))
            ThreePointArc((-1.135026435, -1.048375448), (-0.608332455, -0.493978358), (-0.072427822, 0.068950784))
            Line((-0.072427822, 0.068950784), (0, 0.1))
            Line((0, 0.1), (2.089049154, 0.1))
            Line((2.089049154, 0.1), (2.089049154, 0))
        make_face()
    extrude(amount=12.44524577, mode=Mode.SUBTRACT)


solid = Compound([part.part, body_2.part, body_3.part])
